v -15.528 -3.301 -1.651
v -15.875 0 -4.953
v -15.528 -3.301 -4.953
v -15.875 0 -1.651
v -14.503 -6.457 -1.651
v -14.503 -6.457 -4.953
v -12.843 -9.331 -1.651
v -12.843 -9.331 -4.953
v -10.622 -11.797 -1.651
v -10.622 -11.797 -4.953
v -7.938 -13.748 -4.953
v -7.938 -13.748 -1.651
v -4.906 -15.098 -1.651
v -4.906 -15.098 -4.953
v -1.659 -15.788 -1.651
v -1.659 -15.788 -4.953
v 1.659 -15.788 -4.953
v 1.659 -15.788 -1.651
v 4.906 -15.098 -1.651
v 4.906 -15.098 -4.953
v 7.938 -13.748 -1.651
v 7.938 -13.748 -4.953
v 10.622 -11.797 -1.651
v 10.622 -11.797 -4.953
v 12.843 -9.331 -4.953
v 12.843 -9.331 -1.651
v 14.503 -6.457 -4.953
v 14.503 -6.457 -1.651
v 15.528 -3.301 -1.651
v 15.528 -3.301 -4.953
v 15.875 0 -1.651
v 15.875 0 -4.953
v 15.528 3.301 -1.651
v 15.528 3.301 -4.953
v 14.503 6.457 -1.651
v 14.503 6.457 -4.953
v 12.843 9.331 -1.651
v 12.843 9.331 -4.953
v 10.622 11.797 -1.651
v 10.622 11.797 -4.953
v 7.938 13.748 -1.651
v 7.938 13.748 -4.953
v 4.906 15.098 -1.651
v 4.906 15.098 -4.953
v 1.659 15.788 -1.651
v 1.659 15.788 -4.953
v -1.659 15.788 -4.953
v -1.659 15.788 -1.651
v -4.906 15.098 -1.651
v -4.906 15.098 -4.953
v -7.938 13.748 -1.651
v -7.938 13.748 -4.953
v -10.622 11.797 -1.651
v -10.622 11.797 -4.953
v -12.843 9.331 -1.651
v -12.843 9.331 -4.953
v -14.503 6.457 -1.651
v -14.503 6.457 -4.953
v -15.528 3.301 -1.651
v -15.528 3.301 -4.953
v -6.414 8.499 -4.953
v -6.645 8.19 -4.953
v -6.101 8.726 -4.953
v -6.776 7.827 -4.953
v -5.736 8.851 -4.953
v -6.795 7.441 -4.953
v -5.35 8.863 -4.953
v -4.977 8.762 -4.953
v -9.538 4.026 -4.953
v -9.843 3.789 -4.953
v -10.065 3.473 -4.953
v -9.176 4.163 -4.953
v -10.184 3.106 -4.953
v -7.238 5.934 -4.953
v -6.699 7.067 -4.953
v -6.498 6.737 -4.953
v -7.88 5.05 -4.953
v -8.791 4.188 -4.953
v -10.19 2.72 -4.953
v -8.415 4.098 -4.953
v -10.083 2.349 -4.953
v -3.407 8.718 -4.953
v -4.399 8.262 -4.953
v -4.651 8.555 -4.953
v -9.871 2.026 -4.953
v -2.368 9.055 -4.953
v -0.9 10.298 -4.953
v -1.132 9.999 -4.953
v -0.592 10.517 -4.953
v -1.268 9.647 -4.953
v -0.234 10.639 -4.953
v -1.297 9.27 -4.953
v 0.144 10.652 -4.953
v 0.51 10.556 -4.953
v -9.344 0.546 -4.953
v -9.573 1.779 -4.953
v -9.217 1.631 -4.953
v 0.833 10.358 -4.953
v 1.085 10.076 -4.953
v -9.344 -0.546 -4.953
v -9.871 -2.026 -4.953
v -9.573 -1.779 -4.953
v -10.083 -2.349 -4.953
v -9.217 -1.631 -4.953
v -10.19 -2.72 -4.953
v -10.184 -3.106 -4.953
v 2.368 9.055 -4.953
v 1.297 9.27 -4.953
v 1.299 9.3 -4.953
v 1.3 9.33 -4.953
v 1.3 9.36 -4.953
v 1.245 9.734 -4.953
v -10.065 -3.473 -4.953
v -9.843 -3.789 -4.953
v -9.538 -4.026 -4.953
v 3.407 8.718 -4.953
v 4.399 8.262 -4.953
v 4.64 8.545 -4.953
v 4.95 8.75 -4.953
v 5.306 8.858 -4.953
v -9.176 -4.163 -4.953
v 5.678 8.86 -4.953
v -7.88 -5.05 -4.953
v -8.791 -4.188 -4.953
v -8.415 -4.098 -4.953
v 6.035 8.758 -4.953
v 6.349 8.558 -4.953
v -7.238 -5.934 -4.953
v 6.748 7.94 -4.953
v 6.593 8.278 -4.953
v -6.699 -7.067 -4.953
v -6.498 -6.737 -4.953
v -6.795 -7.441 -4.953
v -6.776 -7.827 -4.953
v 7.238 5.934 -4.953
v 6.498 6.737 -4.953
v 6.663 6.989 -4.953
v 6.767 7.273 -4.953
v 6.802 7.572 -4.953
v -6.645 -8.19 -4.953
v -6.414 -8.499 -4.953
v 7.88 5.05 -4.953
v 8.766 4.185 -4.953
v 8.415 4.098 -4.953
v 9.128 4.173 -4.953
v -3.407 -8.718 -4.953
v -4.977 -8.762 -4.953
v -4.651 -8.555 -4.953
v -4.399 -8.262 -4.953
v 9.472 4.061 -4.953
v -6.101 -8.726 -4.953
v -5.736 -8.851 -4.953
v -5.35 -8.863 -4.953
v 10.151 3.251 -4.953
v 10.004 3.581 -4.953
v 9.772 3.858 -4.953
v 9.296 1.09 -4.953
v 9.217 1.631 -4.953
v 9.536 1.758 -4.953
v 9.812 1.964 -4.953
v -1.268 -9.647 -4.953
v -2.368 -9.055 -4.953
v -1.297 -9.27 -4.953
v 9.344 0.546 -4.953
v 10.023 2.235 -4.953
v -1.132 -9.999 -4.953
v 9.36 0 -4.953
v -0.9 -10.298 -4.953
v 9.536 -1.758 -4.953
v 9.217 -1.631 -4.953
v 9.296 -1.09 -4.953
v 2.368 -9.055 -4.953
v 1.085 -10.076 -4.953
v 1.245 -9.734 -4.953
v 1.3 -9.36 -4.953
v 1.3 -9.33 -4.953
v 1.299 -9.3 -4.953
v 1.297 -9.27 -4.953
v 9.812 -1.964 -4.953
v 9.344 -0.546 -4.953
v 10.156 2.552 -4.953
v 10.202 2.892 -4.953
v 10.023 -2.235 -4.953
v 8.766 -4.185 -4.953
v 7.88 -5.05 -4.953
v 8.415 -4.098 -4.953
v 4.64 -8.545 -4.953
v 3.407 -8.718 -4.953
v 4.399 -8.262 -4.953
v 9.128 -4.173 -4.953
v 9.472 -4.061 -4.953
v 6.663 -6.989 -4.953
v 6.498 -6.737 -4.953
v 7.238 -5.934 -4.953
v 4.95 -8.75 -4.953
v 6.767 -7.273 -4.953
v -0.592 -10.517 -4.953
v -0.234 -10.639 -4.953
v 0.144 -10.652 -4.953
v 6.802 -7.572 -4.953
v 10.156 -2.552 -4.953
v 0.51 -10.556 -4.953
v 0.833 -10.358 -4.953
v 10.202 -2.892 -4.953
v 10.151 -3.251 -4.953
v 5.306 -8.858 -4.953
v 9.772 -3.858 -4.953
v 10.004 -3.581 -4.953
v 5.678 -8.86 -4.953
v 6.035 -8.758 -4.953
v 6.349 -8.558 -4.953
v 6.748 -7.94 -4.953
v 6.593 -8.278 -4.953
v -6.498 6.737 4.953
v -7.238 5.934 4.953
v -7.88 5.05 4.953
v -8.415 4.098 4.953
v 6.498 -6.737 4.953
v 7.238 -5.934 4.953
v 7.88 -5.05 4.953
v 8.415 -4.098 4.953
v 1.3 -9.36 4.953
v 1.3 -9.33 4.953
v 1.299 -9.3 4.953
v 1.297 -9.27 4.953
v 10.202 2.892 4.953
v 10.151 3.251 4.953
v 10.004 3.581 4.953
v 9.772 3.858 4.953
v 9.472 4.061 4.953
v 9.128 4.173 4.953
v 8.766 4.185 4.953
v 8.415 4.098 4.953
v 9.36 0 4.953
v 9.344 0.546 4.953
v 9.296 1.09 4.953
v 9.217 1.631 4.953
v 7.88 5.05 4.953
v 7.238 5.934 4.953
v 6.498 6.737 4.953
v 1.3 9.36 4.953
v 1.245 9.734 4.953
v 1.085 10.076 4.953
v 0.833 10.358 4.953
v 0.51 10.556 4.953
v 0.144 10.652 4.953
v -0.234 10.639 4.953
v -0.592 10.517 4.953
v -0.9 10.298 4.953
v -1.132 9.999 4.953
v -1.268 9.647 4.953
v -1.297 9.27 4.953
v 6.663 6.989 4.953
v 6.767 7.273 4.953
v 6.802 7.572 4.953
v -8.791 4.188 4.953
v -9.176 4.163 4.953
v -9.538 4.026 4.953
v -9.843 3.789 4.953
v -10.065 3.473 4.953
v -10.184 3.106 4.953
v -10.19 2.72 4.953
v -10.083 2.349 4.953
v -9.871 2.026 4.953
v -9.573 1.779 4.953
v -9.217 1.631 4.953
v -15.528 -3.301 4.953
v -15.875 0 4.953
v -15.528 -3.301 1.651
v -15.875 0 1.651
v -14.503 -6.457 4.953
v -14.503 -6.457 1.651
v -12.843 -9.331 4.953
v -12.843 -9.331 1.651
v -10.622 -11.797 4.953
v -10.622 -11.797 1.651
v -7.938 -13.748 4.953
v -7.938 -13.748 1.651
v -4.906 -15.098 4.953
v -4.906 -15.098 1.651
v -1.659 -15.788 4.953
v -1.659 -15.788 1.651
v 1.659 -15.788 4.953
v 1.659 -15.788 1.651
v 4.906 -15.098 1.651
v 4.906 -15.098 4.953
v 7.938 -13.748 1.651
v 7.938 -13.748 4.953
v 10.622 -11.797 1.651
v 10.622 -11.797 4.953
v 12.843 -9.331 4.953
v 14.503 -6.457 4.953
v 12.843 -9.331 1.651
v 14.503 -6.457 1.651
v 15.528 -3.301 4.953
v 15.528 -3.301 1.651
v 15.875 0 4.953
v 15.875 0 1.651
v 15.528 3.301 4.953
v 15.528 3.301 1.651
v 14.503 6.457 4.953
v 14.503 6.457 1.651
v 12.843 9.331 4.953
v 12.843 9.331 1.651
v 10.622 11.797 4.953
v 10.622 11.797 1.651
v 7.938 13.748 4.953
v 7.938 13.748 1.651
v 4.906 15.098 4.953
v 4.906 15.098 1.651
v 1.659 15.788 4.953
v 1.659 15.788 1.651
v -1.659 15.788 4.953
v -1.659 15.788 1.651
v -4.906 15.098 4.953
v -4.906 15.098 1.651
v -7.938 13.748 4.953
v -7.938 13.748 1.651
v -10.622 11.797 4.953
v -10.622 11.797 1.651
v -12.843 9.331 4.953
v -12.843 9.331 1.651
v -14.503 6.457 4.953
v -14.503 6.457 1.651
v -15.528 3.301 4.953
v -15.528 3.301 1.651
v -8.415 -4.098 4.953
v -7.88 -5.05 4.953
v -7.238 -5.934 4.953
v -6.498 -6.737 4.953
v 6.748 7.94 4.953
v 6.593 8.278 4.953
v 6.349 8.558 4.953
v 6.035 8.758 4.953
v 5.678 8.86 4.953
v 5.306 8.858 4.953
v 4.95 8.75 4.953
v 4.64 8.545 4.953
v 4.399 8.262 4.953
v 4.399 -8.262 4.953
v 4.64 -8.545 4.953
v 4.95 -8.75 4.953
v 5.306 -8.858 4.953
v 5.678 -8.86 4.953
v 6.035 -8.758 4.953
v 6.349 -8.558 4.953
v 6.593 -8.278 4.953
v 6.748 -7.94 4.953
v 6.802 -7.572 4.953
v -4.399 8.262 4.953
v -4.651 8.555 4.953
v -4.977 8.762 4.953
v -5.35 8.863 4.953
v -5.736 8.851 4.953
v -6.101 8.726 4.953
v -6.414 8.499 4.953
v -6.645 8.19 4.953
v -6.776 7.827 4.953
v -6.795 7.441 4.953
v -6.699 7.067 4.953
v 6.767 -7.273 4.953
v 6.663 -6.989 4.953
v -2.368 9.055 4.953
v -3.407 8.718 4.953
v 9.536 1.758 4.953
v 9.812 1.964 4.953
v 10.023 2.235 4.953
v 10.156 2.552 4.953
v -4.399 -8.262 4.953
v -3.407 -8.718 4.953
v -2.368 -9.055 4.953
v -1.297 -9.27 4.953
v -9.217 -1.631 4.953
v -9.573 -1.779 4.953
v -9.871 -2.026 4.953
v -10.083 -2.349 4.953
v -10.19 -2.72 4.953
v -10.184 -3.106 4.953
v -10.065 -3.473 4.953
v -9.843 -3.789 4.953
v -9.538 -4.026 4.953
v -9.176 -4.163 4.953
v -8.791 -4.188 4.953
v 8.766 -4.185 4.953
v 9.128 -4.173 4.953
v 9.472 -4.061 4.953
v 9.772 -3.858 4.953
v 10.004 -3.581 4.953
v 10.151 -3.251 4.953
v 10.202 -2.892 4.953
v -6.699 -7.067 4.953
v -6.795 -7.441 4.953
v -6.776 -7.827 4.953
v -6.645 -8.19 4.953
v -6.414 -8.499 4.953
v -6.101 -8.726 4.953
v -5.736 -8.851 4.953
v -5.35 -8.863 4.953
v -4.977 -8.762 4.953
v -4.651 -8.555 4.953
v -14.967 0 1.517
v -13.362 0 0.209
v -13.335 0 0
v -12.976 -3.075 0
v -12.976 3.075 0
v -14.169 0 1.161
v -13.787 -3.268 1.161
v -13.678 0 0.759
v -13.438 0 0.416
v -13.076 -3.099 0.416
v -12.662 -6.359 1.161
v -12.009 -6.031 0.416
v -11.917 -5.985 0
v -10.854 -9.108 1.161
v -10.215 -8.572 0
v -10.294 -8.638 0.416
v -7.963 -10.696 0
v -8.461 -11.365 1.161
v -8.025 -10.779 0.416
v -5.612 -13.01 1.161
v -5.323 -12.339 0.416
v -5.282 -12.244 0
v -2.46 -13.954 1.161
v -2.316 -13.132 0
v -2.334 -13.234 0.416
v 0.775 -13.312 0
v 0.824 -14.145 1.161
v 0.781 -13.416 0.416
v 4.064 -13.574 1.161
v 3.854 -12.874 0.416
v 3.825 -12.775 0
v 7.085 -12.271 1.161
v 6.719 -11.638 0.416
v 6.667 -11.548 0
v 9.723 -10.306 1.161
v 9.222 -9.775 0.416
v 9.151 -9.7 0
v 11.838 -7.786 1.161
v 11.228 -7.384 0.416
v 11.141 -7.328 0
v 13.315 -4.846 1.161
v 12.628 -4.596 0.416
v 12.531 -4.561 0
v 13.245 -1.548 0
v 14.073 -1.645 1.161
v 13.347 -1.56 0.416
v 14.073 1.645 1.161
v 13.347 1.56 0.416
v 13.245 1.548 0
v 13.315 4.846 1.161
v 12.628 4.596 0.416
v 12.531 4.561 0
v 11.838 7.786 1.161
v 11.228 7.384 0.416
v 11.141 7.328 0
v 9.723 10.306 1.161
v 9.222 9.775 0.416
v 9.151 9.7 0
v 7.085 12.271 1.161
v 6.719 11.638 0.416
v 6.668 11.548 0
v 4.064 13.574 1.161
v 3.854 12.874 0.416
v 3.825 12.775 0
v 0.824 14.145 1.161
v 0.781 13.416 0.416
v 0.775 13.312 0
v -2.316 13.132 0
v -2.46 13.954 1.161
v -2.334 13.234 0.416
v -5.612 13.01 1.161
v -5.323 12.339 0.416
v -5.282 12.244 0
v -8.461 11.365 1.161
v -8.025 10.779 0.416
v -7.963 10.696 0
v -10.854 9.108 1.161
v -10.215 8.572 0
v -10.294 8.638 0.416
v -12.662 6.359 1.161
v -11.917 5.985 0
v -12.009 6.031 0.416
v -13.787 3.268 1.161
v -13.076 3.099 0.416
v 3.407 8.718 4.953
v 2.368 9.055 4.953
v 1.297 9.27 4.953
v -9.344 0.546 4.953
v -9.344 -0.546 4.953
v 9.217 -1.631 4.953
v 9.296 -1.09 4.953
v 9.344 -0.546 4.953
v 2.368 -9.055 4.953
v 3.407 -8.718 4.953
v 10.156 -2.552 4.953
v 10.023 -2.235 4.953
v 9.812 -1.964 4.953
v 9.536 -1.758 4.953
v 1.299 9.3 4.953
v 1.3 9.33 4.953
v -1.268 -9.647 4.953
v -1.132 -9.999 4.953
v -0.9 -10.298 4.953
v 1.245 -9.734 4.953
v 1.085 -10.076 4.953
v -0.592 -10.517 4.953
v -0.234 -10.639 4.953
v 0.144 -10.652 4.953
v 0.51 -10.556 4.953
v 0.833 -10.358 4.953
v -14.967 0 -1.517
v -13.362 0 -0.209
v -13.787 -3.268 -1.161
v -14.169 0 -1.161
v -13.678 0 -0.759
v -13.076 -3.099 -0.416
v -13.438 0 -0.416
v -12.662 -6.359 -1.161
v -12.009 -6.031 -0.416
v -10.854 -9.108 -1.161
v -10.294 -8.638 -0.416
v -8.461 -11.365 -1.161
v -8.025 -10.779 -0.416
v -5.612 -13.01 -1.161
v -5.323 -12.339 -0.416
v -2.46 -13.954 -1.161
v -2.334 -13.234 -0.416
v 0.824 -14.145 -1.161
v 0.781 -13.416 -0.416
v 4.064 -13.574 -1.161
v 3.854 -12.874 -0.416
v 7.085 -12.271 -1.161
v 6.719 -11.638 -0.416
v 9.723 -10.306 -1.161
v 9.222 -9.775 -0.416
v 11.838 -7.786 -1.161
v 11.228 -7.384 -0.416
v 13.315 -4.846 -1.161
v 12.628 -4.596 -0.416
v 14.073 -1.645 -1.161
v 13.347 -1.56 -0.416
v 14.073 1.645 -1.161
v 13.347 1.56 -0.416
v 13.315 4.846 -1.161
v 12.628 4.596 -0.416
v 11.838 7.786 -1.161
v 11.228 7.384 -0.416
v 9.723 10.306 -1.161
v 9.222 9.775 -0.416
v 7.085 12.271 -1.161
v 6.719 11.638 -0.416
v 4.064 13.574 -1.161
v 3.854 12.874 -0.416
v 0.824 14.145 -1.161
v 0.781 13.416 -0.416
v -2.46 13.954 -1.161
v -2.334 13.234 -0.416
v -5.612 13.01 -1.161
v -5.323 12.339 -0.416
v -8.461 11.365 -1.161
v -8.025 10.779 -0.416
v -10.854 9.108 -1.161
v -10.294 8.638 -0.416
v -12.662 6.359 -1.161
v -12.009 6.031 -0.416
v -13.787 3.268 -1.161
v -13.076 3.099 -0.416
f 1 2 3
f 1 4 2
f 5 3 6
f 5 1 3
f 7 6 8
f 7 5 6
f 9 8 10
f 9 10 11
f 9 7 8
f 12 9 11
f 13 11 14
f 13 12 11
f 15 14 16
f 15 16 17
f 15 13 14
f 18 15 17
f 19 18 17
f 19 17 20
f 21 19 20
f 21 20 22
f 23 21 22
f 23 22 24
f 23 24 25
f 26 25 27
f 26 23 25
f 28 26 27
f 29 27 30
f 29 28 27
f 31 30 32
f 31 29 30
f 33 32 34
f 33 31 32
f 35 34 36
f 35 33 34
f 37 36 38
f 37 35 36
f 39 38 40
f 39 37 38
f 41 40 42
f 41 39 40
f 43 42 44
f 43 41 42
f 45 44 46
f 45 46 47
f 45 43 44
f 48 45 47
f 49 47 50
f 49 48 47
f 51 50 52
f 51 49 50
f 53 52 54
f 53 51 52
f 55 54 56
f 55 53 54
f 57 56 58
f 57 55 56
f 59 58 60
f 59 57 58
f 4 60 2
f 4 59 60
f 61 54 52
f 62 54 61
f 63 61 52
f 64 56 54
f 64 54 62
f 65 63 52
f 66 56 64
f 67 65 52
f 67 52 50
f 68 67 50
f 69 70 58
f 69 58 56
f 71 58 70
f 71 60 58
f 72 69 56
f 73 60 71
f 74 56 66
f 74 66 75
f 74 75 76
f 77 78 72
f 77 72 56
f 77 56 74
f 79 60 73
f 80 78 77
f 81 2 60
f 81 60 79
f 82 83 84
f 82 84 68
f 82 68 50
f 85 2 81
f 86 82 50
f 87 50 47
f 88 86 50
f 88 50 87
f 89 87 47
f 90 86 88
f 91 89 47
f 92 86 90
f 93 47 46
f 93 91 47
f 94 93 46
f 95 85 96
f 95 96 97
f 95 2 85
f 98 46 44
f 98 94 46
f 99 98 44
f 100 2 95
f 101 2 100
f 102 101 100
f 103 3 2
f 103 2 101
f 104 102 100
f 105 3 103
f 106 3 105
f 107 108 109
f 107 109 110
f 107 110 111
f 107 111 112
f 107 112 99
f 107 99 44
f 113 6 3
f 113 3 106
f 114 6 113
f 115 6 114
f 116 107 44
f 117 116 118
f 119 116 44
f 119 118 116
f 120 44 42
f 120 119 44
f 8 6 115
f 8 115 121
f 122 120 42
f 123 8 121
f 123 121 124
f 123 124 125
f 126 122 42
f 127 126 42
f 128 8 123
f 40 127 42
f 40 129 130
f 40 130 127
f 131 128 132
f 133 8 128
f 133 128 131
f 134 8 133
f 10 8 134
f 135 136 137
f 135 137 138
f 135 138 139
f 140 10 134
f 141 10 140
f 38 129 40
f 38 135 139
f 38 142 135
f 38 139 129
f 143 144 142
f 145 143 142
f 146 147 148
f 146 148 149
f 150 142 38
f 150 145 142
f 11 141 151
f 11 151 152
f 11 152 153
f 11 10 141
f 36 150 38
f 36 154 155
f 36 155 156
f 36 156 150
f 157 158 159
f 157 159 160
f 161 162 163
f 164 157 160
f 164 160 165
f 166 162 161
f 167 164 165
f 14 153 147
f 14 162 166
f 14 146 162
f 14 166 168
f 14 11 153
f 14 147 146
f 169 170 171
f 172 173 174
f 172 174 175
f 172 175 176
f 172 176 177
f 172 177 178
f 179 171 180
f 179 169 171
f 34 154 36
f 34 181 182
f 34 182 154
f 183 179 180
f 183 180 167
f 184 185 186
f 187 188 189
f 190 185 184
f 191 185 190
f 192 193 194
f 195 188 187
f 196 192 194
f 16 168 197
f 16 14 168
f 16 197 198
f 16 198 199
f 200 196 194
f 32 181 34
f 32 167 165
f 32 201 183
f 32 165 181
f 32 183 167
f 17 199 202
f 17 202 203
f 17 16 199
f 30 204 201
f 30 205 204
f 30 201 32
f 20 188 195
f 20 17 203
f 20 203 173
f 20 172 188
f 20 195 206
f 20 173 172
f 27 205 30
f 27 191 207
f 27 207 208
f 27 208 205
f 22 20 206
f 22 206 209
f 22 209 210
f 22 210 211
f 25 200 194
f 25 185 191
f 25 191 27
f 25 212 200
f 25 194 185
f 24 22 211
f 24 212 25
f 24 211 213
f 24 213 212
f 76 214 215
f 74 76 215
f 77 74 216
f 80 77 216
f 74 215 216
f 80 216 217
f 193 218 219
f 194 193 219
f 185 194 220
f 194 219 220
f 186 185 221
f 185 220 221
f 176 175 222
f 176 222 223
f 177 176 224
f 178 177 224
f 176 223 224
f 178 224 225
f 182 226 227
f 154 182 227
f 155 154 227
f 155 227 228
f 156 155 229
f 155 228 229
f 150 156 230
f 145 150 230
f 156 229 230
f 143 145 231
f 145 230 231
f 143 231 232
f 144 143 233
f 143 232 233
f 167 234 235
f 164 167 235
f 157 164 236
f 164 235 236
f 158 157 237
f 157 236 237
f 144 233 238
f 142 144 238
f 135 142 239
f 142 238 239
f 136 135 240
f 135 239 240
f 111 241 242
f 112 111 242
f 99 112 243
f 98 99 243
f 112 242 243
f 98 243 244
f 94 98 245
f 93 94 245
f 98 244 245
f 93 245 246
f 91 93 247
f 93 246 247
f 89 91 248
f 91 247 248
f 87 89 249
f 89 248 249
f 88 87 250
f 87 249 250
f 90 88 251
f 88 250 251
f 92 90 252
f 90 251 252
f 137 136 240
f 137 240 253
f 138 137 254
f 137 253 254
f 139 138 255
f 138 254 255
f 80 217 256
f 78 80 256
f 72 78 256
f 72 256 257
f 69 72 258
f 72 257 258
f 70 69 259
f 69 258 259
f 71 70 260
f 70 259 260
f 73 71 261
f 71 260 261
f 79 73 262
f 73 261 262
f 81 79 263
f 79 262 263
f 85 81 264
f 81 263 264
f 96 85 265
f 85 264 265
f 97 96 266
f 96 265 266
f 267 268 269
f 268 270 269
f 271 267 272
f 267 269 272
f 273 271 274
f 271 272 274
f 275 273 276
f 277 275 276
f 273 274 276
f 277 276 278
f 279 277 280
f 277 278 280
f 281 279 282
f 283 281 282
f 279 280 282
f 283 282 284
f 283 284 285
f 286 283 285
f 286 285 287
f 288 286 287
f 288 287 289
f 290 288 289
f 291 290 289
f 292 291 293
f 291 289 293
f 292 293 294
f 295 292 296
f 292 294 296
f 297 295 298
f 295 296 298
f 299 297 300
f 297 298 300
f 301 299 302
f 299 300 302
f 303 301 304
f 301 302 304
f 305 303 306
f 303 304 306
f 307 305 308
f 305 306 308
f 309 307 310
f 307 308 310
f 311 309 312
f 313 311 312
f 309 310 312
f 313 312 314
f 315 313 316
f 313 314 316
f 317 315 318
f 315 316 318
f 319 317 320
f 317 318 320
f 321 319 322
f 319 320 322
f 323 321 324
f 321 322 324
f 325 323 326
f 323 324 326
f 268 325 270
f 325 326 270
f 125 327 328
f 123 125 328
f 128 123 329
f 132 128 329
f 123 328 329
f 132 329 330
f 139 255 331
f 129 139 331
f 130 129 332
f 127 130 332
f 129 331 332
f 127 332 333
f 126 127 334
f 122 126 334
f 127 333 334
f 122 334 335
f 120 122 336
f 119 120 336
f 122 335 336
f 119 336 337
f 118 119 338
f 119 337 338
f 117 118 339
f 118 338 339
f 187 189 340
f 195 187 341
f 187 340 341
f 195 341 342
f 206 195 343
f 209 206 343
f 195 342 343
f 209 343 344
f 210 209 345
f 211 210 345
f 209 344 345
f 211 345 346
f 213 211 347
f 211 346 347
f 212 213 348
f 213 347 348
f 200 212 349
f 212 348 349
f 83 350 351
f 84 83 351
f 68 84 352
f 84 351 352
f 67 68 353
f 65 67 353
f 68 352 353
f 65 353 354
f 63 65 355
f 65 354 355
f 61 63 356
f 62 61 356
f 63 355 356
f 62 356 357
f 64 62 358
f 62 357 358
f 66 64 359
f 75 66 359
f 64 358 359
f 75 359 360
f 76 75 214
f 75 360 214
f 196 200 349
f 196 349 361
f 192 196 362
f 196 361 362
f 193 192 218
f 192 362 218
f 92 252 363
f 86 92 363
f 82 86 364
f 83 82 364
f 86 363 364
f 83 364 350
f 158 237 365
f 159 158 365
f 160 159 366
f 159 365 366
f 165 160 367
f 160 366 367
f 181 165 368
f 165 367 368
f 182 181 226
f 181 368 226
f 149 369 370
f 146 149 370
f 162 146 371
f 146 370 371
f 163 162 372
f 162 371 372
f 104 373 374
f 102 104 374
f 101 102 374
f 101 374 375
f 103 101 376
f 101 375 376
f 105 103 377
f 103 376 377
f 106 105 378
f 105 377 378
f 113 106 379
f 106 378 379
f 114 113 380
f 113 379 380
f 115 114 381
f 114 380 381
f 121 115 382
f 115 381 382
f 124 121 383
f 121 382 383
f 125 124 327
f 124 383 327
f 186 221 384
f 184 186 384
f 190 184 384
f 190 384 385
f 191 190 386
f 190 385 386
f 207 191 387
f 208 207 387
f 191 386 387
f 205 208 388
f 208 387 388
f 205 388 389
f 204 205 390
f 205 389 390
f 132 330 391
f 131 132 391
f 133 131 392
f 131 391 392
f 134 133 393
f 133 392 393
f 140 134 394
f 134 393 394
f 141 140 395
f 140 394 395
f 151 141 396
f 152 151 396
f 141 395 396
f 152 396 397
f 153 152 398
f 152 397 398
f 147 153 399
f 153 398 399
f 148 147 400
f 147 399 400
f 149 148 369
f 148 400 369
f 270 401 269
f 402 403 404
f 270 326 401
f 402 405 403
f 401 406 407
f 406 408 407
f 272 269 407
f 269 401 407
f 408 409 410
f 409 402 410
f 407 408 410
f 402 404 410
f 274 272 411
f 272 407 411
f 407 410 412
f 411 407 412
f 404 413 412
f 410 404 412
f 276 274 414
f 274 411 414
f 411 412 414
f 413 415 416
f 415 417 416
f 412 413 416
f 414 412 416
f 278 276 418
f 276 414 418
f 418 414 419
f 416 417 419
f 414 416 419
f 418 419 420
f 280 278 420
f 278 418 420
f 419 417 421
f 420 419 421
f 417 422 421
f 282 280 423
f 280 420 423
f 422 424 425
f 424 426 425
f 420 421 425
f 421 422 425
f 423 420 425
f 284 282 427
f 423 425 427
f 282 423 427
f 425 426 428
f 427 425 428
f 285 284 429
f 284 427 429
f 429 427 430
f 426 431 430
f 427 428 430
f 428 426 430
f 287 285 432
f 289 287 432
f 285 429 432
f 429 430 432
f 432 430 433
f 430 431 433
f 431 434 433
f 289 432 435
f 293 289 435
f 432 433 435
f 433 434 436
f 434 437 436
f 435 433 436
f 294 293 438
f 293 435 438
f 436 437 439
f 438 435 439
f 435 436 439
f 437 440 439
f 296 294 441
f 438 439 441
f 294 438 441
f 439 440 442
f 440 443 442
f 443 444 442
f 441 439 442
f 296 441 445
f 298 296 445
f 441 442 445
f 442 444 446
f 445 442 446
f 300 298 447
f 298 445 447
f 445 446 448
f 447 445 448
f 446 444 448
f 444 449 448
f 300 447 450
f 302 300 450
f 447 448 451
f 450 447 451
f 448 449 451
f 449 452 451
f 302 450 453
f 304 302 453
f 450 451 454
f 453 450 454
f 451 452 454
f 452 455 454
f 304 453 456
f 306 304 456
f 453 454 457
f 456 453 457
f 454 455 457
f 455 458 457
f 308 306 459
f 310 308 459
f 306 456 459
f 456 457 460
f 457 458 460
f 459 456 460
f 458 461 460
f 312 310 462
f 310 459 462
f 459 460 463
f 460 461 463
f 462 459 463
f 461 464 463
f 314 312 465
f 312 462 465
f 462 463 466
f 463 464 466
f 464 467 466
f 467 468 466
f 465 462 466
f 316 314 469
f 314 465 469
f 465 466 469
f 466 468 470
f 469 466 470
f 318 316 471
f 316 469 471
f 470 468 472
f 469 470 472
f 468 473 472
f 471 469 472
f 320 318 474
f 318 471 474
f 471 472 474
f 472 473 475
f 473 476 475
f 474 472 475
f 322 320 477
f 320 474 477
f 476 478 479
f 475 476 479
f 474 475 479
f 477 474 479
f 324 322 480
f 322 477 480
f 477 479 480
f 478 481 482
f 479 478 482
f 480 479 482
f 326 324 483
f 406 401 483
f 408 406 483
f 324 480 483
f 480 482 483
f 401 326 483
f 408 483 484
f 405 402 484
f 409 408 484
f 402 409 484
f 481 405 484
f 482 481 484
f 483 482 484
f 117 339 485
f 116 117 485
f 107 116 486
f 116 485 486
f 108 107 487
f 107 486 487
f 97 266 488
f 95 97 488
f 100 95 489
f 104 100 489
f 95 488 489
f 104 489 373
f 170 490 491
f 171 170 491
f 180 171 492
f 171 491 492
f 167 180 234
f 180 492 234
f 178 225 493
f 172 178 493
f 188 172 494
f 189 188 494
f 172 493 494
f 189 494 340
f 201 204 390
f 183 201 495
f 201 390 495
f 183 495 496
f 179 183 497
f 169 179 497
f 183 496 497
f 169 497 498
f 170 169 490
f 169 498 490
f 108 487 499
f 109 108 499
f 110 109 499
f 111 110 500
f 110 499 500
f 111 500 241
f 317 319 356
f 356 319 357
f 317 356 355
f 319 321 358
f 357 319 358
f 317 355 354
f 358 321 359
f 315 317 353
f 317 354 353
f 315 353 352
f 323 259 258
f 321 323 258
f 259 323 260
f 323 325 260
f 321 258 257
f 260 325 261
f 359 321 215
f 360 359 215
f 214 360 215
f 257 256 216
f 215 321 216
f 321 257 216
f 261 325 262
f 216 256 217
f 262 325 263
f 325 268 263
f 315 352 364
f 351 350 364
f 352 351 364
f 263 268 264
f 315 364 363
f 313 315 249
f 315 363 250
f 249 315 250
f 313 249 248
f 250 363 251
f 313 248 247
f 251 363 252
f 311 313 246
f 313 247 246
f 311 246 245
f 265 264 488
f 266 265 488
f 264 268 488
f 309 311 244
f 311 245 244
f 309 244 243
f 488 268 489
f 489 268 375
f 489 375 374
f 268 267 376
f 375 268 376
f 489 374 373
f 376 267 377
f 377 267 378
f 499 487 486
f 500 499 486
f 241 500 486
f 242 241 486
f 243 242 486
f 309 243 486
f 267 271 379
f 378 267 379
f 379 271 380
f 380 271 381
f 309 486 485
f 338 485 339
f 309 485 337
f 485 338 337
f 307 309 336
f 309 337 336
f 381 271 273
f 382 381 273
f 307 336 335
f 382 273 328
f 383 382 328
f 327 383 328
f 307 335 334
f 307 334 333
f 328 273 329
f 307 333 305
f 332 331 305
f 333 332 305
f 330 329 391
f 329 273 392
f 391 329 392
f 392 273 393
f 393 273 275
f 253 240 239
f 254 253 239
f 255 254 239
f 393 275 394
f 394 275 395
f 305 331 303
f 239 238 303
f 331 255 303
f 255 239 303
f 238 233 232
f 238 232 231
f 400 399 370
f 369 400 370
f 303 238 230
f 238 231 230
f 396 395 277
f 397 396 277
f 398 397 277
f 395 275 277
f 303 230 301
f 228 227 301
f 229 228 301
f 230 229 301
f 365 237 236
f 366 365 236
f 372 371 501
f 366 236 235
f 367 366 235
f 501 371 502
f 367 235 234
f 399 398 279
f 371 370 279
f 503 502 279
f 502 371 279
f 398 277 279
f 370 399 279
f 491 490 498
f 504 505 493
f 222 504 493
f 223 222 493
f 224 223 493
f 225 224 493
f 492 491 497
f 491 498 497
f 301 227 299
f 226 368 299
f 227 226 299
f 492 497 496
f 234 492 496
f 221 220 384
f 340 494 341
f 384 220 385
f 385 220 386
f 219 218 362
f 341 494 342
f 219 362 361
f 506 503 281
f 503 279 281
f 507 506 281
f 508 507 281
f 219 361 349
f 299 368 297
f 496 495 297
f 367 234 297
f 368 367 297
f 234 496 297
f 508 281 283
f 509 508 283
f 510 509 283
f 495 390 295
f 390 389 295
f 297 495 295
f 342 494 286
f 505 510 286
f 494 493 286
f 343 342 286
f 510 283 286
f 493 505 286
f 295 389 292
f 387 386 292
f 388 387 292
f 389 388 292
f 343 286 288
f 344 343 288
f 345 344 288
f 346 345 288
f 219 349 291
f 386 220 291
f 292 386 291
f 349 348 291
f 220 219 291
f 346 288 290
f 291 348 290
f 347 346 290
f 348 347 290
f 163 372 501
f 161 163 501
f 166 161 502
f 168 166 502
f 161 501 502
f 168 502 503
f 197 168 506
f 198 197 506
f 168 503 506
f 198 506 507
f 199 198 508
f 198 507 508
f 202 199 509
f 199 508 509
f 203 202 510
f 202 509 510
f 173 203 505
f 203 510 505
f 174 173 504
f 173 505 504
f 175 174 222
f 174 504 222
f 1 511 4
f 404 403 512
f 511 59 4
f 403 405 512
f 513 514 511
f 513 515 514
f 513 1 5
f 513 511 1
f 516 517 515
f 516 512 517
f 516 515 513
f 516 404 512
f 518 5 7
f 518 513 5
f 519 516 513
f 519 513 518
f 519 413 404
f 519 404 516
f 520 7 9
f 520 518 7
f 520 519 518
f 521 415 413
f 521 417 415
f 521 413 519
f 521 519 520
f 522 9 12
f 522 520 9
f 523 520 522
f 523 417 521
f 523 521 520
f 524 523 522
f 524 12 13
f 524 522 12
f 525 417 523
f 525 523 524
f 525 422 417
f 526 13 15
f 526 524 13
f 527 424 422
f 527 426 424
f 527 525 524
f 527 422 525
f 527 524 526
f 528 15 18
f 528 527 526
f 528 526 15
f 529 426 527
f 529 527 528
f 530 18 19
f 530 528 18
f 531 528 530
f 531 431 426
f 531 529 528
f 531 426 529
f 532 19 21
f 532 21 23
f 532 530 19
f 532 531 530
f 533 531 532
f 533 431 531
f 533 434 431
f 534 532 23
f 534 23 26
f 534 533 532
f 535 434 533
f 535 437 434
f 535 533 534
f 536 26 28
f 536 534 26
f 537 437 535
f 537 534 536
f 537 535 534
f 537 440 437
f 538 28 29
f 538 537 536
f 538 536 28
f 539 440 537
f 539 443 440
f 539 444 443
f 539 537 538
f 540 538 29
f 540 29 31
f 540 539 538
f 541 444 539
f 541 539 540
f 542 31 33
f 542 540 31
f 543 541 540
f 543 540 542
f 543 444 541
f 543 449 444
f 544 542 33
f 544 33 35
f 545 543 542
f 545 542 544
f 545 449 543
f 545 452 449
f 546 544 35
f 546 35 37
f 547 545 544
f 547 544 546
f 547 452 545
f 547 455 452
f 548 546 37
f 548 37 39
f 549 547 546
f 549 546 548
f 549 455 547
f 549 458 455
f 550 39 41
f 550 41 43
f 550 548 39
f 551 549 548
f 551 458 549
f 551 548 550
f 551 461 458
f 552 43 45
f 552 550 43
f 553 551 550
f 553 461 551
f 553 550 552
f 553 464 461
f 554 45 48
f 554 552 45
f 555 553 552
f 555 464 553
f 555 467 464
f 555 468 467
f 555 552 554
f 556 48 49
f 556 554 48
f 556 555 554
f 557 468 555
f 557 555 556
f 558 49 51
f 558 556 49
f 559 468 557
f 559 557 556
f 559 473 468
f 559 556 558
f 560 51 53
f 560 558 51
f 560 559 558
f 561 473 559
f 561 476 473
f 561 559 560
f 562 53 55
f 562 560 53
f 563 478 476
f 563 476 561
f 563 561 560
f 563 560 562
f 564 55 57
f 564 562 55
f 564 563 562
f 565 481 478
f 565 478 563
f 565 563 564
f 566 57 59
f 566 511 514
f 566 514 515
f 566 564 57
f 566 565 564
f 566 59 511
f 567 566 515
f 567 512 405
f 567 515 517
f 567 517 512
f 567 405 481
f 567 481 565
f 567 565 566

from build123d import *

# Parameters (mm, degrees)
F4_DEPTH = 9.907


with BuildPart() as f1:
    # F0 (on Front) → F1 (revolve)
    with BuildSketch(Plane.XZ):
        Polygon((0, 0), (0, 4.953), (-15.875, 4.953), (-15.875, 1.651), (-13.335, 1.651), (-13.335, 0), align=None)
        with BuildLine():
            Line((-13.335, 1.651), (-15.875, 1.651))
            add(Edge.make_bspline(
                [(-15.875, 1.651), (-14.605, 1.651), (-13.335, 0.8255), (-13.335, 0)],
                knots=[0, 0, 0, 0, 3.0294225522, 3.0294225522, 3.0294225522, 3.0294225522], degree=3))
            Line((-13.335, 0), (-13.335, 1.651))
        make_face()
    revolve(axis=Axis((0, 0, 11.7816049606), (0, 0, 1)))

    # F2: F1 across plane


with BuildPart() as f1_1:
    add(f1.part)
    add(f1.part.mirror(Plane.XY))

    # F3 (on face) → F4 (cut, through all)
    with BuildSketch(Plane.XY.offset(4.953)):
        with BuildLine():
            ThreePointArc((9.2166859434, -1.6310819203), (9.3240277448, -0.8186785842), (9.3599, 0))
            ThreePointArc((9.3599, 0), (9.3240277448, 0.8186785842), (9.2166859434, 1.6310819203))
            ThreePointArc((9.2166859434, 1.6310819203), (7.6654204157, 2.490646073), (8.4151814581, 4.0978590798))
            ThreePointArc((8.4151814581, 4.0978590798), (7.5723181657, 5.5016111829), (6.497729662, 6.7370050653))
            ThreePointArc((6.497729662, 6.7370050653), (4.737490355, 6.520596073), (4.3993636772, 8.2615571925))
            ThreePointArc((4.3993636772, 8.2615571925), (2.8923681657, 8.9017938869), (1.2968614994, 9.2696212577))
            ThreePointArc((1.2968614994, 9.2696212577), (0, 8.0599), (-1.2968614994, 9.2696212577))
            ThreePointArc((-1.2968614994, 9.2696212577), (-2.8923681657, 8.9017938869), (-4.3993636772, 8.2615571925))
            ThreePointArc((-4.3993636772, 8.2615571925), (-4.2520269006, 7.9308416953), (-4.2016111829, 7.5723181657))
            ThreePointArc((-4.2016111829, 7.5723181657), (-5.0571755986, 6.350648402), (-6.497729662, 6.7370050653))
            ThreePointArc((-6.497729662, 6.7370050653), (-7.5723181656, 5.5016111829), (-8.4151814581, 4.0978590798))
            ThreePointArc((-8.4151814581, 4.0978590798), (-7.824158476, 3.6194870839), (-7.6017938869, 2.8923681657))
            ThreePointArc((-7.6017938869, 2.8923681657), (-8.1015938099, 1.8678293246), (-9.2166859434, 1.6310819203))
            ThreePointArc((-9.2166859434, 1.6310819203), (-9.3599, 0), (-9.2166859434, -1.6310819203))
            ThreePointArc((-9.2166859434, -1.6310819203), (-8.1015938099, -1.8678293246), (-7.6017938869, -2.8923681657))
            ThreePointArc((-7.6017938869, -2.8923681657), (-7.824158476, -3.6194870839), (-8.4151814581, -4.0978590798))
            ThreePointArc((-8.4151814581, -4.0978590798), (-7.5723181656, -5.5016111829), (-6.497729662, -6.7370050653))
            ThreePointArc((-6.497729662, -6.7370050653), (-5.0571755986, -6.350648402), (-4.2016111829, -7.5723181657))
            ThreePointArc((-4.2016111829, -7.5723181657), (-4.2520269006, -7.9308416953), (-4.3993636772, -8.2615571925))
            ThreePointArc((-4.3993636772, -8.2615571925), (-2.8923681657, -8.9017938869), (-1.2968614994, -9.2696212577))
            ThreePointArc((-1.2968614994, -9.2696212577), (0, -8.0599), (1.2968614994, -9.2696212577))
            ThreePointArc((1.2968614994, -9.2696212577), (2.8923681657, -8.9017938869), (4.3993636772, -8.2615571925))
            ThreePointArc((4.3993636772, -8.2615571925), (4.737490355, -6.520596073), (6.497729662, -6.7370050653))
            ThreePointArc((6.497729662, -6.7370050653), (7.5723181657, -5.5016111829), (8.4151814581, -4.0978590798))
            ThreePointArc((8.4151814581, -4.0978590798), (7.6654204157, -2.490646073), (9.2166859434, -1.6310819203))
        make_face()
        with BuildLine():
            ThreePointArc((8.4151814581, 4.0978590798), (7.6654204157, 2.490646073), (9.2166859434, 1.6310819203))
            ThreePointArc((9.2166859434, 1.6310819203), (8.9017938869, 2.8923681657), (8.4151814581, 4.0978590798))
        make_face()
        with BuildLine():
            ThreePointArc((8.4151814581, 4.0978590798), (8.9017938869, 2.8923681657), (9.2166859434, 1.6310819203))
            ThreePointArc((9.2166859434, 1.6310819203), (9.9263327279, 2.0921680886), (10.2017938869, 2.8923681657))
            ThreePointArc((10.2017938869, 2.8923681657), (9.6289128051, 3.9700035765), (8.4151814581, 4.0978590798))
        make_face()
        with BuildLine():
            ThreePointArc((10.2017938869, -2.8923681657), (9.9263327279, -2.0921680886), (9.2166859434, -1.6310819203))
            ThreePointArc((9.2166859434, -1.6310819203), (8.9017938869, -2.8923681657), (8.4151814581, -4.0978590798))
            ThreePointArc((8.4151814581, -4.0978590798), (9.6289128051, -3.9700035765), (10.2017938869, -2.8923681657))
        make_face()
        with BuildLine():
            ThreePointArc((8.4151814581, -4.0978590798), (8.9017938869, -2.8923681657), (9.2166859434, -1.6310819203))
            ThreePointArc((9.2166859434, -1.6310819203), (7.6654204157, -2.490646073), (8.4151814581, -4.0978590798))
        make_face()
        with BuildLine():
            ThreePointArc((4.3993636772, 8.2615571925), (4.737490355, 6.520596073), (6.497729662, 6.7370050653))
            ThreePointArc((6.497729662, 6.7370050653), (5.5016111829, 7.5723181657), (4.3993636772, 8.2615571925))
        make_face()
        with BuildLine():
            ThreePointArc((4.3993636772, 8.2615571925), (5.5016111829, 7.5723181657), (6.497729662, 6.7370050653))
            ThreePointArc((6.497729662, 6.7370050653), (6.7232809466, 7.1278825813), (6.8016111829, 7.5723181657))
            ThreePointArc((6.8016111829, 7.5723181657), (5.8601347126, 8.821902448), (4.3993636772, 8.2615571925))
        make_face()
        with BuildLine():
            ThreePointArc((6.8016111829, -7.5723181657), (6.7232809466, -7.1278825813), (6.497729662, -6.7370050653))
            ThreePointArc((6.497729662, -6.7370050653), (5.5016111829, -7.5723181657), (4.3993636772, -8.2615571925))
            ThreePointArc((4.3993636772, -8.2615571925), (5.8601347126, -8.821902448), (6.8016111829, -7.5723181657))
        make_face()
        with BuildLine():
            ThreePointArc((4.3993636772, -8.2615571925), (5.5016111829, -7.5723181657), (6.497729662, -6.7370050653))
            ThreePointArc((6.497729662, -6.7370050653), (4.737490355, -6.520596073), (4.3993636772, -8.2615571925))
        make_face()
        with BuildLine():
            ThreePointArc((-1.2968614994, 9.2696212577), (0, 8.0599), (1.2968614994, 9.2696212577))
            ThreePointArc((1.2968614994, 9.2696212577), (0, 9.3599), (-1.2968614994, 9.2696212577))
        make_face()
        with BuildLine():
            ThreePointArc((-1.2968614994, 9.2696212577), (0, 9.3599), (1.2968614994, 9.2696212577))
            ThreePointArc((1.2968614994, 9.2696212577), (1.2992151379, 9.3147333599), (1.3, 9.3599))
            ThreePointArc((1.3, 9.3599), (-0.0451666401, 10.6591151379), (-1.2968614994, 9.2696212577))
        make_face()
        with BuildLine():
            ThreePointArc((1.3, -9.3599), (1.2992151379, -9.3147333599), (1.2968614994, -9.2696212577))
            ThreePointArc((1.2968614994, -9.2696212577), (0, -9.3599), (-1.2968614994, -9.2696212577))
            ThreePointArc((-1.2968614994, -9.2696212577), (-0.0451666401, -10.6591151379), (1.3, -9.3599))
        make_face()
        with BuildLine():
            ThreePointArc((-1.2968614994, -9.2696212577), (0, -9.3599), (1.2968614994, -9.2696212577))
            ThreePointArc((1.2968614994, -9.2696212577), (0, -8.0599), (-1.2968614994, -9.2696212577))
        make_face()
        with BuildLine():
            ThreePointArc((-4.2016111829, 7.5723181657), (-4.2520269006, 7.9308416953), (-4.3993636772, 8.2615571925))
            ThreePointArc((-4.3993636772, 8.2615571925), (-5.5016111829, 7.5723181657), (-6.497729662, 6.7370050653))
            ThreePointArc((-6.497729662, 6.7370050653), (-5.0571755986, 6.350648402), (-4.2016111829, 7.5723181657))
        make_face()
        with BuildLine():
            ThreePointArc((-6.497729662, 6.7370050653), (-5.5016111829, 7.5723181657), (-4.3993636772, 8.2615571925))
            ThreePointArc((-4.3993636772, 8.2615571925), (-6.2657320109, 8.6240402583), (-6.497729662, 6.7370050653))
        make_face()
        with BuildLine():
            ThreePointArc((-6.497729662, -6.7370050653), (-6.2657320109, -8.6240402583), (-4.3993636772, -8.2615571925))
            ThreePointArc((-4.3993636772, -8.2615571925), (-5.5016111829, -7.5723181657), (-6.497729662, -6.7370050653))
        make_face()
        with BuildLine():
            ThreePointArc((-6.497729662, -6.7370050653), (-5.5016111829, -7.5723181657), (-4.3993636772, -8.2615571925))
            ThreePointArc((-4.3993636772, -8.2615571925), (-4.2520269006, -7.9308416953), (-4.2016111829, -7.5723181657))
            ThreePointArc((-4.2016111829, -7.5723181657), (-5.0571755986, -6.350648402), (-6.497729662, -6.7370050653))
        make_face()
        with BuildLine():
            ThreePointArc((-7.6017938869, 2.8923681657), (-7.824158476, 3.6194870839), (-8.4151814581, 4.0978590798))
            ThreePointArc((-8.4151814581, 4.0978590798), (-8.9017938869, 2.8923681657), (-9.2166859434, 1.6310819203))
            ThreePointArc((-9.2166859434, 1.6310819203), (-8.1015938099, 1.8678293246), (-7.6017938869, 2.8923681657))
        make_face()
        with BuildLine():
            ThreePointArc((-9.2166859434, 1.6310819203), (-8.9017938869, 2.8923681657), (-8.4151814581, 4.0978590798))
            ThreePointArc((-8.4151814581, 4.0978590798), (-10.1381673581, 3.2940902583), (-9.2166859434, 1.6310819203))
        make_face()
        with BuildLine():
            ThreePointArc((-9.2166859434, -1.6310819203), (-10.1381673581, -3.2940902583), (-8.4151814581, -4.0978590798))
            ThreePointArc((-8.4151814581, -4.0978590798), (-8.9017938869, -2.8923681657), (-9.2166859434, -1.6310819203))
        make_face()
        with BuildLine():
            ThreePointArc((-9.2166859434, -1.6310819203), (-8.9017938869, -2.8923681657), (-8.4151814581, -4.0978590798))
            ThreePointArc((-8.4151814581, -4.0978590798), (-7.824158476, -3.6194870839), (-7.6017938869, -2.8923681657))
            ThreePointArc((-7.6017938869, -2.8923681657), (-8.1015938099, -1.8678293246), (-9.2166859434, -1.6310819203))
        make_face()
    extrude(amount=-F4_DEPTH, mode=Mode.SUBTRACT)


solid = f1_1.part
